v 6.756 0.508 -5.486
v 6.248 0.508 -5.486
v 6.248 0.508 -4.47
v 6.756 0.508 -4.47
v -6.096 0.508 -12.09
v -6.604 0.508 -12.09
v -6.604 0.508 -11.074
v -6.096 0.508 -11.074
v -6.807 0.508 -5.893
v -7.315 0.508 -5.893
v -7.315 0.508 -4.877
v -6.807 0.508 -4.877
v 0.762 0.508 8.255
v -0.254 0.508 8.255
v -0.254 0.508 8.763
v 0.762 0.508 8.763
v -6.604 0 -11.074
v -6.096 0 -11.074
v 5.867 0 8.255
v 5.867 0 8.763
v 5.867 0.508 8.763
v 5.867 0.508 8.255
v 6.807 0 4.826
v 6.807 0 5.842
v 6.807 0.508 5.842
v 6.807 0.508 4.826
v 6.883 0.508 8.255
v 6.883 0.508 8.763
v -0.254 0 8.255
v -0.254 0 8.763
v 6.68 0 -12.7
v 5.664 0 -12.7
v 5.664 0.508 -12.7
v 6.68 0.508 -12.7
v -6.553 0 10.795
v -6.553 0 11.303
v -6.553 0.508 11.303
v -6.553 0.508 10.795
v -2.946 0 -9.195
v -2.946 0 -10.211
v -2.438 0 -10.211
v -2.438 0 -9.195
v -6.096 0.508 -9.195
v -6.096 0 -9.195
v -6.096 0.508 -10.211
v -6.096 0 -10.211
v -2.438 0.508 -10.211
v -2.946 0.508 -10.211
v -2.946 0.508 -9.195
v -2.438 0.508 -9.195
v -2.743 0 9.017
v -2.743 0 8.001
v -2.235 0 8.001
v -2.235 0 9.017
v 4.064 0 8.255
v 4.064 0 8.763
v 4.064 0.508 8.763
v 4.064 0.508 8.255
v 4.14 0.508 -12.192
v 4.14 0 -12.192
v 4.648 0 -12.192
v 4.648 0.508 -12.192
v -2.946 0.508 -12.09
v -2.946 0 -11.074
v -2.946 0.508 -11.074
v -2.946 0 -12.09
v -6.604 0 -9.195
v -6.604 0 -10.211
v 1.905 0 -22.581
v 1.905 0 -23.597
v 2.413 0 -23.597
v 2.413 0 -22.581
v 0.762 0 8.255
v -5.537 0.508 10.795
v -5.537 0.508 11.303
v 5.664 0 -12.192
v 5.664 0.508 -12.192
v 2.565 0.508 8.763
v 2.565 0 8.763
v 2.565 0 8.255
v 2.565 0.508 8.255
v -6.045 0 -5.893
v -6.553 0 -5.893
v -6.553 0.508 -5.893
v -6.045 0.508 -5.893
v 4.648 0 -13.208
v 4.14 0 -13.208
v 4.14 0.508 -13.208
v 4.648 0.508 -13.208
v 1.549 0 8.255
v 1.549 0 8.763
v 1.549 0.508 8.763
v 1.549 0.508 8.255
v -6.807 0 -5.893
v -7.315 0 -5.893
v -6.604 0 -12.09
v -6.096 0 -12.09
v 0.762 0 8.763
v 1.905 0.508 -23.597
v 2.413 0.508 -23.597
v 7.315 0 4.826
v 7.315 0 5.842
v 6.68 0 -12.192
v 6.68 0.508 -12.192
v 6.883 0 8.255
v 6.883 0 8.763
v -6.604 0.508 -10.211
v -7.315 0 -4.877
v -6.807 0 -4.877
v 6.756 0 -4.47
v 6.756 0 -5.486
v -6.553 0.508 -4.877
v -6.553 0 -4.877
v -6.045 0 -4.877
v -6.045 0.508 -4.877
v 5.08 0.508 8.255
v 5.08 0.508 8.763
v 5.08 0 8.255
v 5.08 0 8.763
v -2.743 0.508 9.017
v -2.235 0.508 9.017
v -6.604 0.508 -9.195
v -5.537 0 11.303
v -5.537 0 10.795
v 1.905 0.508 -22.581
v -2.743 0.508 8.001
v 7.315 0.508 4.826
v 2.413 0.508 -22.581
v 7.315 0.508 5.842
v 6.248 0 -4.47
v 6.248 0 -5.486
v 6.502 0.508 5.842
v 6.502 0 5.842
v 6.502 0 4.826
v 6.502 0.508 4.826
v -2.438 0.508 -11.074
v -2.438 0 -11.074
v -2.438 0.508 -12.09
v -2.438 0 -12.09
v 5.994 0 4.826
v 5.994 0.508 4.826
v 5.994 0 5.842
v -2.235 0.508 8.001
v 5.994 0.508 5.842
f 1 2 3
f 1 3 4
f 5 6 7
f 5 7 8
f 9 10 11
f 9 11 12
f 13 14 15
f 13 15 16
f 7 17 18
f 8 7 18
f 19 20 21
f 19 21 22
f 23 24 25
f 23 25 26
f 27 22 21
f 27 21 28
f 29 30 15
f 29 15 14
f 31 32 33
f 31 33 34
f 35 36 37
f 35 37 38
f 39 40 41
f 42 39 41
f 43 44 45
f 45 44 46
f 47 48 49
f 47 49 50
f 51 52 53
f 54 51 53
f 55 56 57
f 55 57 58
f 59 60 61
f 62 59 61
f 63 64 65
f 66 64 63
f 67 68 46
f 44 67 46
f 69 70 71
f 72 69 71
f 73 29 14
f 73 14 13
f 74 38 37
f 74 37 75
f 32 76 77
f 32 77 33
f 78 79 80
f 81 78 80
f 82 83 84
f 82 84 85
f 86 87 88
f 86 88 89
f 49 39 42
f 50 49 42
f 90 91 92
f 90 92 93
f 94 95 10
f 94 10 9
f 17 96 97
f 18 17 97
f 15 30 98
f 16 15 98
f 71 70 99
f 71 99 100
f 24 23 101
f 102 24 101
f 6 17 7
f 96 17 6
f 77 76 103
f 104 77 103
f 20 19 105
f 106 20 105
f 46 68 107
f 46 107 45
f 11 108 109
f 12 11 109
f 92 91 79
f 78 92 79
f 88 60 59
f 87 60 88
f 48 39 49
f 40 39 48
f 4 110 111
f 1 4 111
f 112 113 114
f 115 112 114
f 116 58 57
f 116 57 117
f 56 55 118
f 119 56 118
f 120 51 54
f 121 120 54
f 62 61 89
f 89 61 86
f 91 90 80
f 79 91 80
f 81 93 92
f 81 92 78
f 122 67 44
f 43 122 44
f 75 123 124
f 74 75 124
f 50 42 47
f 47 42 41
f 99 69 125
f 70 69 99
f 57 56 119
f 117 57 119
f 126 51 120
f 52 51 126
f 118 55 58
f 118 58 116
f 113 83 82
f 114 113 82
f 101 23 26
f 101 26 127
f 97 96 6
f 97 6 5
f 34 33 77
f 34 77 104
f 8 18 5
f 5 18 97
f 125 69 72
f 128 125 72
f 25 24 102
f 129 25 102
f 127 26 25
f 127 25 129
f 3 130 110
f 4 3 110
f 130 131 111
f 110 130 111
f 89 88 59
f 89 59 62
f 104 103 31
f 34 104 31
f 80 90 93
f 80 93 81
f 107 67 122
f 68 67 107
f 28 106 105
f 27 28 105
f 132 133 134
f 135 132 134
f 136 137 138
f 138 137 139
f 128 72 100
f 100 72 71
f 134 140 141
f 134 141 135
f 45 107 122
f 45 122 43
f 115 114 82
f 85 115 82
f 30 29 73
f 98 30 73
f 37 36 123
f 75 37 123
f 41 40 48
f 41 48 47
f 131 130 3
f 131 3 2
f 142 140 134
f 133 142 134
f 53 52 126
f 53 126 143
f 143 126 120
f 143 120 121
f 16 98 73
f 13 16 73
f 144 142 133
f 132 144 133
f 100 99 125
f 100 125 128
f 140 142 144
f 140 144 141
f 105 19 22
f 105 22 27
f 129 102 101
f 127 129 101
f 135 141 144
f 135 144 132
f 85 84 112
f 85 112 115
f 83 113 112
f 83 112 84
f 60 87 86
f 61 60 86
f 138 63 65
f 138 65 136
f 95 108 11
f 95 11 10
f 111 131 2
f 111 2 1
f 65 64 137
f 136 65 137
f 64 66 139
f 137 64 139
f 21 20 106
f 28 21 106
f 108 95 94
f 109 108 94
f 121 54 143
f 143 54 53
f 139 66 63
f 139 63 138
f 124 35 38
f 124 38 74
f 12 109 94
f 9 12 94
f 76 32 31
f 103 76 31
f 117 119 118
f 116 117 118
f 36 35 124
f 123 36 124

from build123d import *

# Parameters (mm, degrees)
SKETCH2_W              = 1.016
SKETCH2_H              = 0.508
BOSS_EXTRUDE1_DEPTH    = 0.508
BOSS_EXTRUDE1_2_DEPTH  = 0.508
BOSS_EXTRUDE1_3_DEPTH  = 0.508
BOSS_EXTRUDE1_4_DEPTH  = 0.508
SKETCH2_W_2            = 0.508
SKETCH2_H_2            = 1.016
BOSS_EXTRUDE1_5_DEPTH  = 0.508
BOSS_EXTRUDE1_6_DEPTH  = 0.508
BOSS_EXTRUDE1_7_DEPTH  = 0.508
BOSS_EXTRUDE1_8_DEPTH  = 0.508
BOSS_EXTRUDE1_9_DEPTH  = 0.508
BOSS_EXTRUDE1_10_DEPTH = 0.508
BOSS_EXTRUDE1_11_DEPTH = 0.508
BOSS_EXTRUDE1_12_DEPTH = 0.508
BOSS_EXTRUDE1_13_DEPTH = 0.508
BOSS_EXTRUDE1_14_DEPTH = 0.508
BOSS_EXTRUDE1_15_DEPTH = 0.508
BOSS_EXTRUDE1_16_DEPTH = 0.508
BOSS_EXTRUDE1_17_DEPTH = 0.508
BOSS_EXTRUDE1_18_DEPTH = 0.508


with BuildPart() as part:
    # Sketch2 → Boss-Extrude1 (new body)
    with BuildSketch(Plane(origin=(0, 0, 0), x_dir=(1, 0, 0), z_dir=(0, 1, 0))):
        with Locations((6.3754, -8.509)):
            Rectangle(SKETCH2_W, SKETCH2_H)
    extrude(amount=BOSS_EXTRUDE1_DEPTH)


with BuildPart() as body_2:
    # Sketch2 → Boss-Extrude1 2 (new body)
    with BuildSketch(Plane(origin=(0, 0, 0), x_dir=(1, 0, 0), z_dir=(0, 1, 0))):
        with Locations((4.572, -8.509)):
            Rectangle(SKETCH2_W, SKETCH2_H)
    extrude(amount=BOSS_EXTRUDE1_2_DEPTH)


with BuildPart() as body_3:
    # Sketch2 → Boss-Extrude1 3 (new body)
    with BuildSketch(Plane(origin=(0, 0, 0), x_dir=(1, 0, 0), z_dir=(0, 1, 0))):
        with Locations((2.0574, -8.509)):
            Rectangle(SKETCH2_W, SKETCH2_H)
    extrude(amount=BOSS_EXTRUDE1_3_DEPTH)


with BuildPart() as body_4:
    # Sketch2 → Boss-Extrude1 4 (new body)
    with BuildSketch(Plane(origin=(0, 0, 0), x_dir=(1, 0, 0), z_dir=(0, 1, 0))):
        with Locations((0.254, -8.509)):
            Rectangle(SKETCH2_W, SKETCH2_H)
    extrude(amount=BOSS_EXTRUDE1_4_DEPTH)


with BuildPart() as body_5:
    # Sketch2 → Boss-Extrude1 5 (new body)
    with BuildSketch(Plane(origin=(0, 0, 0), x_dir=(1, 0, 0), z_dir=(0, 1, 0))):
        with Locations((-2.4892, -8.509)):
            Rectangle(SKETCH2_W_2, SKETCH2_H_2)
    extrude(amount=BOSS_EXTRUDE1_5_DEPTH)


with BuildPart() as body_6:
    # Sketch2 → Boss-Extrude1 6 (new body)
    with BuildSketch(Plane(origin=(0, 0, 0), x_dir=(1, 0, 0), z_dir=(0, 1, 0))):
        with Locations((-6.0452, -11.049)):
            Rectangle(SKETCH2_W, SKETCH2_H)
    extrude(amount=BOSS_EXTRUDE1_6_DEPTH)


with BuildPart() as body_7:
    # Sketch2 → Boss-Extrude1 7 (new body)
    with BuildSketch(Plane(origin=(0, 0, 0), x_dir=(1, 0, 0), z_dir=(0, 1, 0))):
        with Locations((6.2484, -5.334)):
            Rectangle(SKETCH2_W_2, SKETCH2_H_2)
    extrude(amount=BOSS_EXTRUDE1_7_DEPTH)


with BuildPart() as body_8:
    # Sketch2 → Boss-Extrude1 8 (new body)
    with BuildSketch(Plane(origin=(0, 0, 0), x_dir=(1, 0, 0), z_dir=(0, 1, 0))):
        with Locations((7.0612, -5.334)):
            Rectangle(SKETCH2_W_2, SKETCH2_H_2)
    extrude(amount=BOSS_EXTRUDE1_8_DEPTH)


with BuildPart() as body_9:
    # Sketch2 → Boss-Extrude1 9 (new body)
    with BuildSketch(Plane(origin=(0, 0, 0), x_dir=(1, 0, 0), z_dir=(0, 1, 0))):
        with Locations((6.5024, 4.9784)):
            Rectangle(SKETCH2_W_2, SKETCH2_H_2)
    extrude(amount=BOSS_EXTRUDE1_9_DEPTH)


with BuildPart() as body_10:
    # Sketch2 → Boss-Extrude1 10 (new body)
    with BuildSketch(Plane(origin=(0, 0, 0), x_dir=(1, 0, 0), z_dir=(0, 1, 0))):
        with Locations((-6.2992, 5.3848)):
            Rectangle(SKETCH2_W_2, SKETCH2_H_2)
    extrude(amount=BOSS_EXTRUDE1_10_DEPTH)


with BuildPart() as body_11:
    # Sketch2 → Boss-Extrude1 11 (new body)
    with BuildSketch(Plane(origin=(0, 0, 0), x_dir=(1, 0, 0), z_dir=(0, 1, 0))):
        with Locations((-7.0612, 5.3848)):
            Rectangle(SKETCH2_W_2, SKETCH2_H_2)
    extrude(amount=BOSS_EXTRUDE1_11_DEPTH)


with BuildPart() as body_12:
    # Sketch2 → Boss-Extrude1 12 (new body)
    with BuildSketch(Plane(origin=(0, 0, 0), x_dir=(1, 0, 0), z_dir=(0, 1, 0))):
        with Locations((-6.35, 9.7028)):
            Rectangle(SKETCH2_W_2, SKETCH2_H_2)
    extrude(amount=BOSS_EXTRUDE1_12_DEPTH)


with BuildPart() as body_13:
    # Sketch2 → Boss-Extrude1 13 (new body)
    with BuildSketch(Plane(origin=(0, 0, 0), x_dir=(1, 0, 0), z_dir=(0, 1, 0))):
        with Locations((-6.35, 11.5824)):
            Rectangle(SKETCH2_W_2, SKETCH2_H_2)
    extrude(amount=BOSS_EXTRUDE1_13_DEPTH)


with BuildPart() as body_14:
    # Sketch2 → Boss-Extrude1 14 (new body)
    with BuildSketch(Plane(origin=(0, 0, 0), x_dir=(1, 0, 0), z_dir=(0, 1, 0))):
        with Locations((-2.6924, 11.5824)):
            Rectangle(SKETCH2_W_2, SKETCH2_H_2)
    extrude(amount=BOSS_EXTRUDE1_14_DEPTH)


with BuildPart() as body_15:
    # Sketch2 → Boss-Extrude1 15 (new body)
    with BuildSketch(Plane(origin=(0, 0, 0), x_dir=(1, 0, 0), z_dir=(0, 1, 0))):
        with Locations((-2.6924, 9.7028)):
            Rectangle(SKETCH2_W_2, SKETCH2_H_2)
    extrude(amount=BOSS_EXTRUDE1_15_DEPTH)


with BuildPart() as body_16:
    # Sketch2 → Boss-Extrude1 16 (new body)
    with BuildSketch(Plane(origin=(0, 0, 0), x_dir=(1, 0, 0), z_dir=(0, 1, 0))):
        with Locations((6.1722, 12.446)):
            Rectangle(SKETCH2_W, SKETCH2_H)
    extrude(amount=BOSS_EXTRUDE1_16_DEPTH)


with BuildPart() as body_17:
    # Sketch2 → Boss-Extrude1 17 (new body)
    with BuildSketch(Plane(origin=(0, 0, 0), x_dir=(1, 0, 0), z_dir=(0, 1, 0))):
        with Locations((4.3942, 12.7)):
            Rectangle(SKETCH2_W_2, SKETCH2_H_2)
    extrude(amount=BOSS_EXTRUDE1_17_DEPTH)


with BuildPart() as body_18:
    # Sketch2 → Boss-Extrude1 18 (new body)
    with BuildSketch(Plane(origin=(0, 0, 0), x_dir=(1, 0, 0), z_dir=(0, 1, 0))):
        with Locations((2.159, 23.0886)):
            Rectangle(SKETCH2_W_2, SKETCH2_H_2)
    extrude(amount=BOSS_EXTRUDE1_18_DEPTH)


solid = Compound([part.part, body_2.part, body_3.part, body_4.part, body_5.part, body_6.part, body_7.part, body_8.part, body_9.part, body_10.part, body_11.part, body_12.part, body_13.part, body_14.part, body_15.part, body_16.part, body_17.part, body_18.part])
